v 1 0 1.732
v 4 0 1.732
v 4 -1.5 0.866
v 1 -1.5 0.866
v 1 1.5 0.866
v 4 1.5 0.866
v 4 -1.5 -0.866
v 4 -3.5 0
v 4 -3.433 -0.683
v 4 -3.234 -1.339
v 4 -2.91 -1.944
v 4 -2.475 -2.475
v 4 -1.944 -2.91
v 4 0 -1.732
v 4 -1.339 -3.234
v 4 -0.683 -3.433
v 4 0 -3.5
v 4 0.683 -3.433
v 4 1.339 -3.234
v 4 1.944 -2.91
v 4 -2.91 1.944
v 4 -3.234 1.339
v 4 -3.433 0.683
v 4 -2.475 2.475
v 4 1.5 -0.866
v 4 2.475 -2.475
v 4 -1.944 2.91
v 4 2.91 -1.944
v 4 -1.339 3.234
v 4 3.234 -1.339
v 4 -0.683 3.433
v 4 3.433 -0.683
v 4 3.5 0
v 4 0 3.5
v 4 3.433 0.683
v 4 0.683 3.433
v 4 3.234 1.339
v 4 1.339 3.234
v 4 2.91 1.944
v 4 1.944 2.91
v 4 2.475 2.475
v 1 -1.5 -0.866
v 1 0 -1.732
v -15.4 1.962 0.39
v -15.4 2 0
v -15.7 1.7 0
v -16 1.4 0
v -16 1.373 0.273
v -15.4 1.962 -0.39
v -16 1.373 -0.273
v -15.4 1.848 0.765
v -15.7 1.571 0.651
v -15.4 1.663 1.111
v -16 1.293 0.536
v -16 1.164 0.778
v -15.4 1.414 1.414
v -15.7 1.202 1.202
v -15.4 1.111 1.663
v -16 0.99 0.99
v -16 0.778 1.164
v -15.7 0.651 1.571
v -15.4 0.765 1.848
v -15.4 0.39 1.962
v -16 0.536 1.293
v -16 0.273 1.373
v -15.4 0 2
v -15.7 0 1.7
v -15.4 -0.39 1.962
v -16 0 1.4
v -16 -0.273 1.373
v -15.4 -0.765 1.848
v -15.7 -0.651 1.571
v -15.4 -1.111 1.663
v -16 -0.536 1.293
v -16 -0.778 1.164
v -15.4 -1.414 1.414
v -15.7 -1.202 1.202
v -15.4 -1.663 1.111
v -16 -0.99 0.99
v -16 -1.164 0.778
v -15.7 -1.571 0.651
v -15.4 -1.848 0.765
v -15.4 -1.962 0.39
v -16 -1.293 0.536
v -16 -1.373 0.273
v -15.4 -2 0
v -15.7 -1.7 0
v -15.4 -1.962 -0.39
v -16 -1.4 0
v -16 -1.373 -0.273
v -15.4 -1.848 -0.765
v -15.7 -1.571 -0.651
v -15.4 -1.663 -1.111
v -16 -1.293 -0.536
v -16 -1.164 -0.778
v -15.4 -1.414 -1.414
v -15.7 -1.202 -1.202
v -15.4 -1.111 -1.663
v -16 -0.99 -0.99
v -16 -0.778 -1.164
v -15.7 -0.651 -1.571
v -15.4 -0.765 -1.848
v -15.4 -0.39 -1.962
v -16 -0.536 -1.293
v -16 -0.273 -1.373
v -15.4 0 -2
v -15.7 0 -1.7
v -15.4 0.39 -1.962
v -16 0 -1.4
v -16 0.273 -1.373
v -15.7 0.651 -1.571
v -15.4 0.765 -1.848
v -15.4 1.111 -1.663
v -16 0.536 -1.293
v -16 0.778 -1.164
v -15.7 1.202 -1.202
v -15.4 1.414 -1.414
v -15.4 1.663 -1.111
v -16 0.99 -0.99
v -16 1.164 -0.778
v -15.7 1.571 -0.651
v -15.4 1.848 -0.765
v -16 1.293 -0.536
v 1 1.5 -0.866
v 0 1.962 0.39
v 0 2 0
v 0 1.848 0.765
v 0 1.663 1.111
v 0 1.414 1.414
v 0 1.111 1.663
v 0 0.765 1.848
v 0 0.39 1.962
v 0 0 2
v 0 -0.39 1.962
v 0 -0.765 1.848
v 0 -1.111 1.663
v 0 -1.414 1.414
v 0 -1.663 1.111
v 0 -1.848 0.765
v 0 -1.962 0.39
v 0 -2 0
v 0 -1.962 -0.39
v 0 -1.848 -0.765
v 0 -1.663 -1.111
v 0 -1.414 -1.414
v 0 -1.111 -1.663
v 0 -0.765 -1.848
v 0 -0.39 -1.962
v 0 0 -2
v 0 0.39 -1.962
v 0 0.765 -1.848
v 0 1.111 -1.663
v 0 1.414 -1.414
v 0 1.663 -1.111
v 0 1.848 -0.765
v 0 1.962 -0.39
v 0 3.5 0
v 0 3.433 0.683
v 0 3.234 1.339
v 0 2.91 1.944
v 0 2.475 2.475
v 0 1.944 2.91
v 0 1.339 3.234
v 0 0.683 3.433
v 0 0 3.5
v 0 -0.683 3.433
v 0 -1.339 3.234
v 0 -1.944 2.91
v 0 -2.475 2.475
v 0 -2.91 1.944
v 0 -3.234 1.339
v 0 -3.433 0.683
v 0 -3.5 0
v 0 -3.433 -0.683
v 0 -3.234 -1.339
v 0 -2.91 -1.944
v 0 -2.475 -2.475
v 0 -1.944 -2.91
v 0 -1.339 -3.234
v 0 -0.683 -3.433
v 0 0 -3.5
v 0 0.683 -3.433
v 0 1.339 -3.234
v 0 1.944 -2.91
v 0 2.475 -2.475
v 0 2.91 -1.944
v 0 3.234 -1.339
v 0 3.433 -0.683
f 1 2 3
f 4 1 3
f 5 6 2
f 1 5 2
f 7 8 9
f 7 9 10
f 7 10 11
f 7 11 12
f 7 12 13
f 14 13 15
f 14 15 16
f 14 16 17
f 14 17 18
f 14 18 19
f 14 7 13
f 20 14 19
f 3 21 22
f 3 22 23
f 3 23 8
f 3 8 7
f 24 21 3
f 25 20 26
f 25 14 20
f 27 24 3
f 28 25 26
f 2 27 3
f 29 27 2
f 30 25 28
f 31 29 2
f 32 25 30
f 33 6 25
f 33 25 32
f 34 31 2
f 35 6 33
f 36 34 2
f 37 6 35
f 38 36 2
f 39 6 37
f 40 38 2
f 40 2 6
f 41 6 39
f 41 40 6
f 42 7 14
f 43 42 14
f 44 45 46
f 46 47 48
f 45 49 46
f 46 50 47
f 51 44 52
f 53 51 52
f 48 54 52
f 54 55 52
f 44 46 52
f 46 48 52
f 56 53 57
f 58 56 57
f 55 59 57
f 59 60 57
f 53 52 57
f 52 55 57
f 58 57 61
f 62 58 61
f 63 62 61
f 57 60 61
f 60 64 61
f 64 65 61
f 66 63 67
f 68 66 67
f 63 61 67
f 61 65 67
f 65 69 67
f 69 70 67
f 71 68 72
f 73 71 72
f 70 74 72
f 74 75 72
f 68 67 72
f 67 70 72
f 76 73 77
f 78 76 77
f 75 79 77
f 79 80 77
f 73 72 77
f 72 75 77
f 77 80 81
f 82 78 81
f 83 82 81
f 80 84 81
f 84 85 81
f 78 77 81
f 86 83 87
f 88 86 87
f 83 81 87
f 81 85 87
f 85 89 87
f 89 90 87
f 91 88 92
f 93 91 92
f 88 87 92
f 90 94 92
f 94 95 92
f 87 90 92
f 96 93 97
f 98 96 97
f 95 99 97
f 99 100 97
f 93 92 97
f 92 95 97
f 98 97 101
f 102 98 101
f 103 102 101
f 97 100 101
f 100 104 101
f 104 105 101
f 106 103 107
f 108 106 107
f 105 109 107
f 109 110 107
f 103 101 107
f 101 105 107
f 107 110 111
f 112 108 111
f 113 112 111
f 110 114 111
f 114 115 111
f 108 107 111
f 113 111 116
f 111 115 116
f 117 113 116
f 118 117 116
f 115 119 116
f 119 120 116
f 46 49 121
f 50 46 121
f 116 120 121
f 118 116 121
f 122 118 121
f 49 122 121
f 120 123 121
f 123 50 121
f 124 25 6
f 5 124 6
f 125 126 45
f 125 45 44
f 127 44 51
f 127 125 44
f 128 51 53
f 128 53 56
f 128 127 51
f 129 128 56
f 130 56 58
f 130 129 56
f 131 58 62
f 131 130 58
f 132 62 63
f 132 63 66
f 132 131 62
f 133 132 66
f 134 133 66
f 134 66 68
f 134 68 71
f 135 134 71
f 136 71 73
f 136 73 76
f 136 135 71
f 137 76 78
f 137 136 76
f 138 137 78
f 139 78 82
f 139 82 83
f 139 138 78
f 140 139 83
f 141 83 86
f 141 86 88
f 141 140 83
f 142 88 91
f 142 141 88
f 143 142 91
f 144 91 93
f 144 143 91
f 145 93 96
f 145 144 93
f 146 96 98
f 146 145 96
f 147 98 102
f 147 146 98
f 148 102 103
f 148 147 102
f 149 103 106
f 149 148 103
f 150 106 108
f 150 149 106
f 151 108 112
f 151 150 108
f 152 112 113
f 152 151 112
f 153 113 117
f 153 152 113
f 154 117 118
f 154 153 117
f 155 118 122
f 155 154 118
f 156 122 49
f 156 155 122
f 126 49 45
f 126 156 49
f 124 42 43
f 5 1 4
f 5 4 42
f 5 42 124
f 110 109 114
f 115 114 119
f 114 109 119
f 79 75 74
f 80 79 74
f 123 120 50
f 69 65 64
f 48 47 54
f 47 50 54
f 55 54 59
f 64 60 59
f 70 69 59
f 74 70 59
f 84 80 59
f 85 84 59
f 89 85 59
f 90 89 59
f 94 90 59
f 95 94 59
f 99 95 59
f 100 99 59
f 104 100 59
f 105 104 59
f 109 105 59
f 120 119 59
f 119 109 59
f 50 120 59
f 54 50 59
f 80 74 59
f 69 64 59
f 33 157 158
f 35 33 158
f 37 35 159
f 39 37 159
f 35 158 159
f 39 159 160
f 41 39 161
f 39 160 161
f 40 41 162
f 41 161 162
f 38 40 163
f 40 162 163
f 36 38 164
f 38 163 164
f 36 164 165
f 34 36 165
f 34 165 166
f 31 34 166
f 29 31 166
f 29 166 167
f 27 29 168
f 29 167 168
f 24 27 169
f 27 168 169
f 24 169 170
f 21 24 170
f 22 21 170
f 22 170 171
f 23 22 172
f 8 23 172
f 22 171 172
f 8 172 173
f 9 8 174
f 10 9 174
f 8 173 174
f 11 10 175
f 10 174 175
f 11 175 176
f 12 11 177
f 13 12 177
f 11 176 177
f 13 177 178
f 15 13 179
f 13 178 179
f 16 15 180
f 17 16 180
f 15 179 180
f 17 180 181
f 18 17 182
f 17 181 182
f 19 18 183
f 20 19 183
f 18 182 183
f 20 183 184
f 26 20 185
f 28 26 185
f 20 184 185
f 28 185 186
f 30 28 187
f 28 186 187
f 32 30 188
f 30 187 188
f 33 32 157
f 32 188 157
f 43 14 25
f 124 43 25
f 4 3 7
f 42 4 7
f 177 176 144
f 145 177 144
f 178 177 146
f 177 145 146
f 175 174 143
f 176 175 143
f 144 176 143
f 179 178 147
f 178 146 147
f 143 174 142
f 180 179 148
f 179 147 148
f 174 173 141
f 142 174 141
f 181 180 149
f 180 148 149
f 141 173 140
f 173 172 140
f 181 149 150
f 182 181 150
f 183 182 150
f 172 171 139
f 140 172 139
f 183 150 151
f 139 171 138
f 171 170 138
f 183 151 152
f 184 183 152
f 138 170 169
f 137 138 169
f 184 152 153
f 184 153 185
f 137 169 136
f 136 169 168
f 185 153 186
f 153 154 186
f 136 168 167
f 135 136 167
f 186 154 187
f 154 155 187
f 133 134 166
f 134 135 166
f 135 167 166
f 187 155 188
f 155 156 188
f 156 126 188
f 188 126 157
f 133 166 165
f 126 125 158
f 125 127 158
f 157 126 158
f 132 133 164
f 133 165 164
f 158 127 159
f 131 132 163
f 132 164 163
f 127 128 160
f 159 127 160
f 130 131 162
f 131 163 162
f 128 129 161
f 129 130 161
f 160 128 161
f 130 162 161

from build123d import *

# Parameters (mm, degrees)
F0_R     = 2
F1_DEPTH = 16
F2_R     = 3.5
F3_DEPTH = 4
F5_DEPTH = 3
F6_SIZE  = 0.6


with BuildPart() as f1:
    # F0 (on Right) → F1 (new body)
    with BuildSketch(Plane.YZ):
        Circle(F0_R)
    extrude(amount=-F1_DEPTH)

    # F2 (on face) → F3 (join)
    with BuildSketch(Plane.YZ):
        Circle(F2_R)
    extrude(amount=F3_DEPTH)

    # F4 (on face) → F5 (cut)
    with BuildSketch(Plane.YZ.offset(4)):
        Polygon((1.5, 0.866025), (0, 1.732051), (-1.5, 0.866025), (-1.5, -0.866025), (0, -1.732051), (1.5, -0.866025), align=None)
    extrude(amount=-F5_DEPTH, mode=Mode.SUBTRACT)

    # F6
    f6_edges = [f1.edges().sort_by_distance(p)[0] for p in [
        (-16, -2, 0),
    ]]
    chamfer(f6_edges, length=F6_SIZE)


solid = f1.part
